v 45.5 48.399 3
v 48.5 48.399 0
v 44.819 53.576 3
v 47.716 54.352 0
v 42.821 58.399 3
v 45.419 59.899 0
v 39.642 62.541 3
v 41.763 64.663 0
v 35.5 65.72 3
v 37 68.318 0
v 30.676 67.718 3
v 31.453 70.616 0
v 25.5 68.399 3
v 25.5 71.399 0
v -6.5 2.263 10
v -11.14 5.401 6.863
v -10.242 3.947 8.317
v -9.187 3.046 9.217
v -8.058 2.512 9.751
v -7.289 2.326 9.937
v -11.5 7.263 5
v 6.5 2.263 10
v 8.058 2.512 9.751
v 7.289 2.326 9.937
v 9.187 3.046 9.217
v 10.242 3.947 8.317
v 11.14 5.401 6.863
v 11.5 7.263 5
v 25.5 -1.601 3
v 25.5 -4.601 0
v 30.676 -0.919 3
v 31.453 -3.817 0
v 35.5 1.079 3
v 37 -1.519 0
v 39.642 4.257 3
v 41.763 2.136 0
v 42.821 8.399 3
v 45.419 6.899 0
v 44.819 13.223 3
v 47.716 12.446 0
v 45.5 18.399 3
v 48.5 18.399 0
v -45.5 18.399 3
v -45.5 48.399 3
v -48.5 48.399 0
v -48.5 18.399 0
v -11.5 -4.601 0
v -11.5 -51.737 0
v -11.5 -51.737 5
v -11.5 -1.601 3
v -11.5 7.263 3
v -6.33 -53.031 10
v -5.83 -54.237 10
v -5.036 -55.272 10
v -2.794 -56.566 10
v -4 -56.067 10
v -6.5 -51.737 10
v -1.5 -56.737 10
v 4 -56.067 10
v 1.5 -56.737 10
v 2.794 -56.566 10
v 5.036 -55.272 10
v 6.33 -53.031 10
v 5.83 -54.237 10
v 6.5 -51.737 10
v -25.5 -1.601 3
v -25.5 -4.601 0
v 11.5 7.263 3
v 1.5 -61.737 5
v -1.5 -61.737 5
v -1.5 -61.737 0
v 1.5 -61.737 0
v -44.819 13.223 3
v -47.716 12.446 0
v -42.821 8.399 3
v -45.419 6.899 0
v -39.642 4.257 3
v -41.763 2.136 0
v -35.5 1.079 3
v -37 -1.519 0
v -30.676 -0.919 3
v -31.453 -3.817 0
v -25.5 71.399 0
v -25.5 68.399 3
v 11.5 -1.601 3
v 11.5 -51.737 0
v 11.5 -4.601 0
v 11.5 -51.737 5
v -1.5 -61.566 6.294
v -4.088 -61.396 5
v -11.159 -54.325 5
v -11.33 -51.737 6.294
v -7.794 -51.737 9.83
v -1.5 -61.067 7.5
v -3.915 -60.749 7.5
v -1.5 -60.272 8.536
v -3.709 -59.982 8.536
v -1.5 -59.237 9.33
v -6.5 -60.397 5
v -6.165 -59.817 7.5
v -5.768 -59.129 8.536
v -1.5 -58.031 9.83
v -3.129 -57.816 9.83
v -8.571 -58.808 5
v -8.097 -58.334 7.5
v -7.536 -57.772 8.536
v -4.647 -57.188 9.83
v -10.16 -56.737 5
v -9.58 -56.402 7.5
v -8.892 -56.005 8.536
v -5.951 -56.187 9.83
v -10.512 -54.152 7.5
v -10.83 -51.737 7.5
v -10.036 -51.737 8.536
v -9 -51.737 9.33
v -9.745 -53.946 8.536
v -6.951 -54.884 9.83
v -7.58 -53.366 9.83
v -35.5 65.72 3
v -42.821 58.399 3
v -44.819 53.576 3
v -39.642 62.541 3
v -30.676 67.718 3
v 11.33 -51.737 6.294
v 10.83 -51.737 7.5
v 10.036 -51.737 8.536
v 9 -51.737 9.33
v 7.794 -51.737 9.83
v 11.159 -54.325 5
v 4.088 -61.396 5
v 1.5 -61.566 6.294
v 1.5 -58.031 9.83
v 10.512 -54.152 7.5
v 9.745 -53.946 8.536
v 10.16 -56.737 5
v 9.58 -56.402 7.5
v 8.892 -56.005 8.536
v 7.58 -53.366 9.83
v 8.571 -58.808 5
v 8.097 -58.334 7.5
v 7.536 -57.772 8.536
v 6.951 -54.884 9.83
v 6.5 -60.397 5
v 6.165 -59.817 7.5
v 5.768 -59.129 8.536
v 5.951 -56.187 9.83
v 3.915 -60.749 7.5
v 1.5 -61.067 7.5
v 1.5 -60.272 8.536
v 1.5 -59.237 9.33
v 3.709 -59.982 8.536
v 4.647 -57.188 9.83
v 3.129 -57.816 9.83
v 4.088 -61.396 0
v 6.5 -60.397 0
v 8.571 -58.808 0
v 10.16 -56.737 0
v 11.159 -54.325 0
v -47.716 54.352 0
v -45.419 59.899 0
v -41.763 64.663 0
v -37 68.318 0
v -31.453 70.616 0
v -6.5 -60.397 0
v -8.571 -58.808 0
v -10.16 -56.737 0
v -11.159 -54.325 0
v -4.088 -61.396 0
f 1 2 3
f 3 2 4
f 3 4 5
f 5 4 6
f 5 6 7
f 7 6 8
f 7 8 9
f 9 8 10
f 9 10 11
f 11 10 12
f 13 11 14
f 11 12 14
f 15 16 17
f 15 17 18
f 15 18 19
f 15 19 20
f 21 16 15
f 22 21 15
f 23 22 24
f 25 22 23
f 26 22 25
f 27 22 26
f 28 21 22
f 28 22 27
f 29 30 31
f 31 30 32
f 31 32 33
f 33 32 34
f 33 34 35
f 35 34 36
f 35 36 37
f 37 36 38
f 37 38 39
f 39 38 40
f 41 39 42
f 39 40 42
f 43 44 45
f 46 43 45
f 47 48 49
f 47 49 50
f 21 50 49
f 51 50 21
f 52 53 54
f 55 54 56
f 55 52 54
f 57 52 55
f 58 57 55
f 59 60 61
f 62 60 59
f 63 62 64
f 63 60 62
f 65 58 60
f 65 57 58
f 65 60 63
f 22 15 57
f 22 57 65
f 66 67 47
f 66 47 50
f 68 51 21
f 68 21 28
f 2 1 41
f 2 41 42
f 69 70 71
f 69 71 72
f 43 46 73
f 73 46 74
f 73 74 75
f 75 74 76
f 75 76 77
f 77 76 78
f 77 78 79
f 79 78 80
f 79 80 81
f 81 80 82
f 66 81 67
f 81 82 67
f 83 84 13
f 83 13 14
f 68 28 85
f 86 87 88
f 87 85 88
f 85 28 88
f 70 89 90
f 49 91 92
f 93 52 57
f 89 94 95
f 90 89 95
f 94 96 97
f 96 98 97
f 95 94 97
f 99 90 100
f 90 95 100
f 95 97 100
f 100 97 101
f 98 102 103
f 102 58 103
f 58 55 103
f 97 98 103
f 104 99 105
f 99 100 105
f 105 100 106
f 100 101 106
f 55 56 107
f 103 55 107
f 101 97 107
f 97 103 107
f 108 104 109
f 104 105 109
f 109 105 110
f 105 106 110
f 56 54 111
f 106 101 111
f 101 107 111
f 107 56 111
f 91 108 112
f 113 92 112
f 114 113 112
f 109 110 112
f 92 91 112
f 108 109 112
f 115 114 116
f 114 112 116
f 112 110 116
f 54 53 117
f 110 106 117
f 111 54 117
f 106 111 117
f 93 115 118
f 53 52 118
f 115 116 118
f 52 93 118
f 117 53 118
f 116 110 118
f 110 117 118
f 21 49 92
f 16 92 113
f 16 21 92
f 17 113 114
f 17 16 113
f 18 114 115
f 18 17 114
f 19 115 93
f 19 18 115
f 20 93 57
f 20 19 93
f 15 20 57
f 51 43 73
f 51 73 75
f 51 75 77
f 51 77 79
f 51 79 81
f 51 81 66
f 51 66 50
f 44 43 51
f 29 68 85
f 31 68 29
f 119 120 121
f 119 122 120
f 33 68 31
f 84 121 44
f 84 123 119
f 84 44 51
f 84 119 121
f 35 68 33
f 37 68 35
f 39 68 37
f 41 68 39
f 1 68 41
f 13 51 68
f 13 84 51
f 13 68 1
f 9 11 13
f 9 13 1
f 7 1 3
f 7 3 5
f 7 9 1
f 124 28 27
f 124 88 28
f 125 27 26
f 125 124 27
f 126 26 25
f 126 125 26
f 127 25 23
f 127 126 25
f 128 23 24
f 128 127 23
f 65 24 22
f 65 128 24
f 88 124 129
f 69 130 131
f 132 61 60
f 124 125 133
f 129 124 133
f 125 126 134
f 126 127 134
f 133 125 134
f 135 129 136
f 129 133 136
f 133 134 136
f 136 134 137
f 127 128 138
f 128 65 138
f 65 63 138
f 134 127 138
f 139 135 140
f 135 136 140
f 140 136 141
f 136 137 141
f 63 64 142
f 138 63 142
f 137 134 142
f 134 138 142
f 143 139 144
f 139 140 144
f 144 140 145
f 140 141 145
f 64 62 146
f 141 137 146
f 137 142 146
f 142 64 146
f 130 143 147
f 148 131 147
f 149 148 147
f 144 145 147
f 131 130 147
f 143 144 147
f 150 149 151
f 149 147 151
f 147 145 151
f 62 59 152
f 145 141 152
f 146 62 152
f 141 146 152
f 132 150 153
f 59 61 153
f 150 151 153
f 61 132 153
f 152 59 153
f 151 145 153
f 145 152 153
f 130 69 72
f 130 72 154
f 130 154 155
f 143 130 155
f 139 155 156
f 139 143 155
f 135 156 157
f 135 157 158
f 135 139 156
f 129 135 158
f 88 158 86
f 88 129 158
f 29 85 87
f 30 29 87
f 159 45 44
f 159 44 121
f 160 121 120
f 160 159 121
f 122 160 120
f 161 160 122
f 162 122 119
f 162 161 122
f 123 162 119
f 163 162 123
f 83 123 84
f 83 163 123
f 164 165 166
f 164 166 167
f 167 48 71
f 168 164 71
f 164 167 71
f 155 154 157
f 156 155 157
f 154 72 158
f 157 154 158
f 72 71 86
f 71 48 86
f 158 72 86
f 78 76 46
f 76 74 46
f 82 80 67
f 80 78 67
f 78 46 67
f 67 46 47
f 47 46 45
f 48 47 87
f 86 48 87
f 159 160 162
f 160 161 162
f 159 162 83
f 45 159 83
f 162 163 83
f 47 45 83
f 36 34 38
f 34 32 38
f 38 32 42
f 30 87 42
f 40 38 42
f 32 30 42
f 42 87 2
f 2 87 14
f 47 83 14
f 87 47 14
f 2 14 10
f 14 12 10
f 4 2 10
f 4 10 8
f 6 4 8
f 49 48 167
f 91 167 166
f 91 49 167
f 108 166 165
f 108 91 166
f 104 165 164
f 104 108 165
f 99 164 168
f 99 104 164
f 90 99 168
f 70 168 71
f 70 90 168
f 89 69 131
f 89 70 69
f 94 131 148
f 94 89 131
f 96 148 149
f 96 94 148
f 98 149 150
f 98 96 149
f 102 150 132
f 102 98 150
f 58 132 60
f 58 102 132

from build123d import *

# Parameters (mm, degrees)
F0_W         = 101
F0_H         = 80
F1_DEPTH     = 3
F2_R         = 25
F3_W         = 23
F3_H         = 69
F4_DEPTH     = 10
F5_R         = 10
F6_SIZE      = 5
F7_R         = 5
F8_T1_DEPTH  = 30
F8_T3_DEPTH  = 51
F8_T5_DEPTH  = 14
F8_T7_DEPTH  = 14
F8_T10_ANGLE = 90
F8_T12_ANGLE = 90
F8_T14_ANGLE = 90
F8_T16_ANGLE = 90


# Not quite as in the source:
# - a fillet or chamfer that OpenCascade refuses, or shapes differently, is made with other operations: its cross-section is extruded or revolved along the edge and cut away or added


with BuildPart() as f1:
    # F0 (on Top) → F1 (new body)
    with BuildSketch(Plane.XY):
        with Locations((0, 33.399283886)):
            Rectangle(F0_W, F0_H)
    extrude(amount=F1_DEPTH)

    # F2
    f2_edges = [f1.edges().sort_by_distance(p)[0] for p in [
        (50.5, -6.600716, 1.5),
        (50.5, 73.399284, 1.5),
        (-50.5, -6.600716, 1.5),
        (-50.5, 73.399284, 1.5),
    ]]
    fillet(f2_edges, radius=F2_R)

    # F3 (on Top) → F4 (join)
    with BuildSketch(Plane.XY):
        with Locations((0, -27.2368434817)):
            Rectangle(F3_W, F3_H)
    extrude(amount=F4_DEPTH)

    # F5
    f5_edges = [f1.edges().sort_by_distance(p)[0] for p in [
        (11.5, -61.736843, 5),
        (-11.5, -61.736843, 5),
    ]]
    fillet(f5_edges, radius=F5_R)

    # F6
    f6_edges = [f1.edges().sort_by_distance(p)[0] for p in [
        (0, 7.263157, 10),
    ]]
    chamfer(f6_edges, length=F6_SIZE)

    # F7
    f7_edges = [f1.edges().sort_by_distance(p)[0] for p in [
        (-11.5, -24.736843, 10),
    ]]
    fillet(f7_edges, radius=F7_R)

    # F8: chamfer of 5 on 1 edges, made by hand

    # F8_s2 → F8_t1 (cut)
    with BuildSketch(Plane.XZ.offset(-48.399283886)):
        Polygon((-45.5, 3), (-50.5, -2), (-50.5, 3), align=None)
        Polygon((45.5, 3), (50.5, -2), (50.5, 3), align=None)
    extrude(amount=F8_T1_DEPTH, mode=Mode.SUBTRACT)

    # F8_s4 → F8_t3 (cut)
    with BuildSketch(Plane.YZ.offset(-25.5)):
        Polygon((68.399283886, 3), (73.399283886, -2), (73.399283886, 3), align=None)
    extrude(amount=F8_T3_DEPTH, mode=Mode.SUBTRACT)

    # F8_s6 → F8_t5 (cut)
    with BuildSketch(Plane.YZ.offset(11.5)):
        Polygon((-1.600716114, 3), (-6.600716114, -2), (-6.600716114, 3), align=None)
    extrude(amount=F8_T5_DEPTH, mode=Mode.SUBTRACT)

    # F8_s8 → F8_t7 (cut)
    with BuildSketch(Plane.YZ.offset(-25.5)):
        Polygon((-6.600716114, -2), (-1.600716114, 3), (-6.600716114, 3), align=None)
    extrude(amount=F8_T7_DEPTH, mode=Mode.SUBTRACT)

    # F8_s9 → F8_t10 (revolve, cut)
    with BuildSketch(Plane.XZ.offset(-48.399283886)):
        Polygon((-45.5, 3), (-50.5, -2), (-50.5, 3), align=None)
    revolve(axis=Axis((-25.5, 48.399283886, 3), (0, 0, -1)), revolution_arc=F8_T10_ANGLE, mode=Mode.SUBTRACT)

    # F8_s11 → F8_t12 (revolve, cut)
    with BuildSketch(Plane.XZ.offset(-48.399283886)):
        Polygon((45.5, 3), (50.5, -2), (50.5, 3), align=None)
    revolve(axis=Axis((25.5, 48.399283886, 3), (0, 0, 1)), revolution_arc=F8_T12_ANGLE, mode=Mode.SUBTRACT)

    # F8_s13 → F8_t14 (revolve, cut)
    with BuildSketch(Plane.YZ.offset(25.5)):
        Polygon((-1.600716114, 3), (-6.600716114, -2), (-6.600716114, 3), align=None)
    revolve(axis=Axis((25.5, 18.399283886, 3), (0, 0, 1)), revolution_arc=F8_T14_ANGLE, mode=Mode.SUBTRACT)

    # F8_s15 → F8_t16 (revolve, cut)
    with BuildSketch(Plane.XZ.offset(-18.399283886)):
        Polygon((-45.5, 3), (-50.5, -2), (-50.5, 3), align=None)
    revolve(axis=Axis((-25.5, 18.399283886, 3), (0, 0, 1)), revolution_arc=F8_T16_ANGLE, mode=Mode.SUBTRACT)


solid = f1.part
